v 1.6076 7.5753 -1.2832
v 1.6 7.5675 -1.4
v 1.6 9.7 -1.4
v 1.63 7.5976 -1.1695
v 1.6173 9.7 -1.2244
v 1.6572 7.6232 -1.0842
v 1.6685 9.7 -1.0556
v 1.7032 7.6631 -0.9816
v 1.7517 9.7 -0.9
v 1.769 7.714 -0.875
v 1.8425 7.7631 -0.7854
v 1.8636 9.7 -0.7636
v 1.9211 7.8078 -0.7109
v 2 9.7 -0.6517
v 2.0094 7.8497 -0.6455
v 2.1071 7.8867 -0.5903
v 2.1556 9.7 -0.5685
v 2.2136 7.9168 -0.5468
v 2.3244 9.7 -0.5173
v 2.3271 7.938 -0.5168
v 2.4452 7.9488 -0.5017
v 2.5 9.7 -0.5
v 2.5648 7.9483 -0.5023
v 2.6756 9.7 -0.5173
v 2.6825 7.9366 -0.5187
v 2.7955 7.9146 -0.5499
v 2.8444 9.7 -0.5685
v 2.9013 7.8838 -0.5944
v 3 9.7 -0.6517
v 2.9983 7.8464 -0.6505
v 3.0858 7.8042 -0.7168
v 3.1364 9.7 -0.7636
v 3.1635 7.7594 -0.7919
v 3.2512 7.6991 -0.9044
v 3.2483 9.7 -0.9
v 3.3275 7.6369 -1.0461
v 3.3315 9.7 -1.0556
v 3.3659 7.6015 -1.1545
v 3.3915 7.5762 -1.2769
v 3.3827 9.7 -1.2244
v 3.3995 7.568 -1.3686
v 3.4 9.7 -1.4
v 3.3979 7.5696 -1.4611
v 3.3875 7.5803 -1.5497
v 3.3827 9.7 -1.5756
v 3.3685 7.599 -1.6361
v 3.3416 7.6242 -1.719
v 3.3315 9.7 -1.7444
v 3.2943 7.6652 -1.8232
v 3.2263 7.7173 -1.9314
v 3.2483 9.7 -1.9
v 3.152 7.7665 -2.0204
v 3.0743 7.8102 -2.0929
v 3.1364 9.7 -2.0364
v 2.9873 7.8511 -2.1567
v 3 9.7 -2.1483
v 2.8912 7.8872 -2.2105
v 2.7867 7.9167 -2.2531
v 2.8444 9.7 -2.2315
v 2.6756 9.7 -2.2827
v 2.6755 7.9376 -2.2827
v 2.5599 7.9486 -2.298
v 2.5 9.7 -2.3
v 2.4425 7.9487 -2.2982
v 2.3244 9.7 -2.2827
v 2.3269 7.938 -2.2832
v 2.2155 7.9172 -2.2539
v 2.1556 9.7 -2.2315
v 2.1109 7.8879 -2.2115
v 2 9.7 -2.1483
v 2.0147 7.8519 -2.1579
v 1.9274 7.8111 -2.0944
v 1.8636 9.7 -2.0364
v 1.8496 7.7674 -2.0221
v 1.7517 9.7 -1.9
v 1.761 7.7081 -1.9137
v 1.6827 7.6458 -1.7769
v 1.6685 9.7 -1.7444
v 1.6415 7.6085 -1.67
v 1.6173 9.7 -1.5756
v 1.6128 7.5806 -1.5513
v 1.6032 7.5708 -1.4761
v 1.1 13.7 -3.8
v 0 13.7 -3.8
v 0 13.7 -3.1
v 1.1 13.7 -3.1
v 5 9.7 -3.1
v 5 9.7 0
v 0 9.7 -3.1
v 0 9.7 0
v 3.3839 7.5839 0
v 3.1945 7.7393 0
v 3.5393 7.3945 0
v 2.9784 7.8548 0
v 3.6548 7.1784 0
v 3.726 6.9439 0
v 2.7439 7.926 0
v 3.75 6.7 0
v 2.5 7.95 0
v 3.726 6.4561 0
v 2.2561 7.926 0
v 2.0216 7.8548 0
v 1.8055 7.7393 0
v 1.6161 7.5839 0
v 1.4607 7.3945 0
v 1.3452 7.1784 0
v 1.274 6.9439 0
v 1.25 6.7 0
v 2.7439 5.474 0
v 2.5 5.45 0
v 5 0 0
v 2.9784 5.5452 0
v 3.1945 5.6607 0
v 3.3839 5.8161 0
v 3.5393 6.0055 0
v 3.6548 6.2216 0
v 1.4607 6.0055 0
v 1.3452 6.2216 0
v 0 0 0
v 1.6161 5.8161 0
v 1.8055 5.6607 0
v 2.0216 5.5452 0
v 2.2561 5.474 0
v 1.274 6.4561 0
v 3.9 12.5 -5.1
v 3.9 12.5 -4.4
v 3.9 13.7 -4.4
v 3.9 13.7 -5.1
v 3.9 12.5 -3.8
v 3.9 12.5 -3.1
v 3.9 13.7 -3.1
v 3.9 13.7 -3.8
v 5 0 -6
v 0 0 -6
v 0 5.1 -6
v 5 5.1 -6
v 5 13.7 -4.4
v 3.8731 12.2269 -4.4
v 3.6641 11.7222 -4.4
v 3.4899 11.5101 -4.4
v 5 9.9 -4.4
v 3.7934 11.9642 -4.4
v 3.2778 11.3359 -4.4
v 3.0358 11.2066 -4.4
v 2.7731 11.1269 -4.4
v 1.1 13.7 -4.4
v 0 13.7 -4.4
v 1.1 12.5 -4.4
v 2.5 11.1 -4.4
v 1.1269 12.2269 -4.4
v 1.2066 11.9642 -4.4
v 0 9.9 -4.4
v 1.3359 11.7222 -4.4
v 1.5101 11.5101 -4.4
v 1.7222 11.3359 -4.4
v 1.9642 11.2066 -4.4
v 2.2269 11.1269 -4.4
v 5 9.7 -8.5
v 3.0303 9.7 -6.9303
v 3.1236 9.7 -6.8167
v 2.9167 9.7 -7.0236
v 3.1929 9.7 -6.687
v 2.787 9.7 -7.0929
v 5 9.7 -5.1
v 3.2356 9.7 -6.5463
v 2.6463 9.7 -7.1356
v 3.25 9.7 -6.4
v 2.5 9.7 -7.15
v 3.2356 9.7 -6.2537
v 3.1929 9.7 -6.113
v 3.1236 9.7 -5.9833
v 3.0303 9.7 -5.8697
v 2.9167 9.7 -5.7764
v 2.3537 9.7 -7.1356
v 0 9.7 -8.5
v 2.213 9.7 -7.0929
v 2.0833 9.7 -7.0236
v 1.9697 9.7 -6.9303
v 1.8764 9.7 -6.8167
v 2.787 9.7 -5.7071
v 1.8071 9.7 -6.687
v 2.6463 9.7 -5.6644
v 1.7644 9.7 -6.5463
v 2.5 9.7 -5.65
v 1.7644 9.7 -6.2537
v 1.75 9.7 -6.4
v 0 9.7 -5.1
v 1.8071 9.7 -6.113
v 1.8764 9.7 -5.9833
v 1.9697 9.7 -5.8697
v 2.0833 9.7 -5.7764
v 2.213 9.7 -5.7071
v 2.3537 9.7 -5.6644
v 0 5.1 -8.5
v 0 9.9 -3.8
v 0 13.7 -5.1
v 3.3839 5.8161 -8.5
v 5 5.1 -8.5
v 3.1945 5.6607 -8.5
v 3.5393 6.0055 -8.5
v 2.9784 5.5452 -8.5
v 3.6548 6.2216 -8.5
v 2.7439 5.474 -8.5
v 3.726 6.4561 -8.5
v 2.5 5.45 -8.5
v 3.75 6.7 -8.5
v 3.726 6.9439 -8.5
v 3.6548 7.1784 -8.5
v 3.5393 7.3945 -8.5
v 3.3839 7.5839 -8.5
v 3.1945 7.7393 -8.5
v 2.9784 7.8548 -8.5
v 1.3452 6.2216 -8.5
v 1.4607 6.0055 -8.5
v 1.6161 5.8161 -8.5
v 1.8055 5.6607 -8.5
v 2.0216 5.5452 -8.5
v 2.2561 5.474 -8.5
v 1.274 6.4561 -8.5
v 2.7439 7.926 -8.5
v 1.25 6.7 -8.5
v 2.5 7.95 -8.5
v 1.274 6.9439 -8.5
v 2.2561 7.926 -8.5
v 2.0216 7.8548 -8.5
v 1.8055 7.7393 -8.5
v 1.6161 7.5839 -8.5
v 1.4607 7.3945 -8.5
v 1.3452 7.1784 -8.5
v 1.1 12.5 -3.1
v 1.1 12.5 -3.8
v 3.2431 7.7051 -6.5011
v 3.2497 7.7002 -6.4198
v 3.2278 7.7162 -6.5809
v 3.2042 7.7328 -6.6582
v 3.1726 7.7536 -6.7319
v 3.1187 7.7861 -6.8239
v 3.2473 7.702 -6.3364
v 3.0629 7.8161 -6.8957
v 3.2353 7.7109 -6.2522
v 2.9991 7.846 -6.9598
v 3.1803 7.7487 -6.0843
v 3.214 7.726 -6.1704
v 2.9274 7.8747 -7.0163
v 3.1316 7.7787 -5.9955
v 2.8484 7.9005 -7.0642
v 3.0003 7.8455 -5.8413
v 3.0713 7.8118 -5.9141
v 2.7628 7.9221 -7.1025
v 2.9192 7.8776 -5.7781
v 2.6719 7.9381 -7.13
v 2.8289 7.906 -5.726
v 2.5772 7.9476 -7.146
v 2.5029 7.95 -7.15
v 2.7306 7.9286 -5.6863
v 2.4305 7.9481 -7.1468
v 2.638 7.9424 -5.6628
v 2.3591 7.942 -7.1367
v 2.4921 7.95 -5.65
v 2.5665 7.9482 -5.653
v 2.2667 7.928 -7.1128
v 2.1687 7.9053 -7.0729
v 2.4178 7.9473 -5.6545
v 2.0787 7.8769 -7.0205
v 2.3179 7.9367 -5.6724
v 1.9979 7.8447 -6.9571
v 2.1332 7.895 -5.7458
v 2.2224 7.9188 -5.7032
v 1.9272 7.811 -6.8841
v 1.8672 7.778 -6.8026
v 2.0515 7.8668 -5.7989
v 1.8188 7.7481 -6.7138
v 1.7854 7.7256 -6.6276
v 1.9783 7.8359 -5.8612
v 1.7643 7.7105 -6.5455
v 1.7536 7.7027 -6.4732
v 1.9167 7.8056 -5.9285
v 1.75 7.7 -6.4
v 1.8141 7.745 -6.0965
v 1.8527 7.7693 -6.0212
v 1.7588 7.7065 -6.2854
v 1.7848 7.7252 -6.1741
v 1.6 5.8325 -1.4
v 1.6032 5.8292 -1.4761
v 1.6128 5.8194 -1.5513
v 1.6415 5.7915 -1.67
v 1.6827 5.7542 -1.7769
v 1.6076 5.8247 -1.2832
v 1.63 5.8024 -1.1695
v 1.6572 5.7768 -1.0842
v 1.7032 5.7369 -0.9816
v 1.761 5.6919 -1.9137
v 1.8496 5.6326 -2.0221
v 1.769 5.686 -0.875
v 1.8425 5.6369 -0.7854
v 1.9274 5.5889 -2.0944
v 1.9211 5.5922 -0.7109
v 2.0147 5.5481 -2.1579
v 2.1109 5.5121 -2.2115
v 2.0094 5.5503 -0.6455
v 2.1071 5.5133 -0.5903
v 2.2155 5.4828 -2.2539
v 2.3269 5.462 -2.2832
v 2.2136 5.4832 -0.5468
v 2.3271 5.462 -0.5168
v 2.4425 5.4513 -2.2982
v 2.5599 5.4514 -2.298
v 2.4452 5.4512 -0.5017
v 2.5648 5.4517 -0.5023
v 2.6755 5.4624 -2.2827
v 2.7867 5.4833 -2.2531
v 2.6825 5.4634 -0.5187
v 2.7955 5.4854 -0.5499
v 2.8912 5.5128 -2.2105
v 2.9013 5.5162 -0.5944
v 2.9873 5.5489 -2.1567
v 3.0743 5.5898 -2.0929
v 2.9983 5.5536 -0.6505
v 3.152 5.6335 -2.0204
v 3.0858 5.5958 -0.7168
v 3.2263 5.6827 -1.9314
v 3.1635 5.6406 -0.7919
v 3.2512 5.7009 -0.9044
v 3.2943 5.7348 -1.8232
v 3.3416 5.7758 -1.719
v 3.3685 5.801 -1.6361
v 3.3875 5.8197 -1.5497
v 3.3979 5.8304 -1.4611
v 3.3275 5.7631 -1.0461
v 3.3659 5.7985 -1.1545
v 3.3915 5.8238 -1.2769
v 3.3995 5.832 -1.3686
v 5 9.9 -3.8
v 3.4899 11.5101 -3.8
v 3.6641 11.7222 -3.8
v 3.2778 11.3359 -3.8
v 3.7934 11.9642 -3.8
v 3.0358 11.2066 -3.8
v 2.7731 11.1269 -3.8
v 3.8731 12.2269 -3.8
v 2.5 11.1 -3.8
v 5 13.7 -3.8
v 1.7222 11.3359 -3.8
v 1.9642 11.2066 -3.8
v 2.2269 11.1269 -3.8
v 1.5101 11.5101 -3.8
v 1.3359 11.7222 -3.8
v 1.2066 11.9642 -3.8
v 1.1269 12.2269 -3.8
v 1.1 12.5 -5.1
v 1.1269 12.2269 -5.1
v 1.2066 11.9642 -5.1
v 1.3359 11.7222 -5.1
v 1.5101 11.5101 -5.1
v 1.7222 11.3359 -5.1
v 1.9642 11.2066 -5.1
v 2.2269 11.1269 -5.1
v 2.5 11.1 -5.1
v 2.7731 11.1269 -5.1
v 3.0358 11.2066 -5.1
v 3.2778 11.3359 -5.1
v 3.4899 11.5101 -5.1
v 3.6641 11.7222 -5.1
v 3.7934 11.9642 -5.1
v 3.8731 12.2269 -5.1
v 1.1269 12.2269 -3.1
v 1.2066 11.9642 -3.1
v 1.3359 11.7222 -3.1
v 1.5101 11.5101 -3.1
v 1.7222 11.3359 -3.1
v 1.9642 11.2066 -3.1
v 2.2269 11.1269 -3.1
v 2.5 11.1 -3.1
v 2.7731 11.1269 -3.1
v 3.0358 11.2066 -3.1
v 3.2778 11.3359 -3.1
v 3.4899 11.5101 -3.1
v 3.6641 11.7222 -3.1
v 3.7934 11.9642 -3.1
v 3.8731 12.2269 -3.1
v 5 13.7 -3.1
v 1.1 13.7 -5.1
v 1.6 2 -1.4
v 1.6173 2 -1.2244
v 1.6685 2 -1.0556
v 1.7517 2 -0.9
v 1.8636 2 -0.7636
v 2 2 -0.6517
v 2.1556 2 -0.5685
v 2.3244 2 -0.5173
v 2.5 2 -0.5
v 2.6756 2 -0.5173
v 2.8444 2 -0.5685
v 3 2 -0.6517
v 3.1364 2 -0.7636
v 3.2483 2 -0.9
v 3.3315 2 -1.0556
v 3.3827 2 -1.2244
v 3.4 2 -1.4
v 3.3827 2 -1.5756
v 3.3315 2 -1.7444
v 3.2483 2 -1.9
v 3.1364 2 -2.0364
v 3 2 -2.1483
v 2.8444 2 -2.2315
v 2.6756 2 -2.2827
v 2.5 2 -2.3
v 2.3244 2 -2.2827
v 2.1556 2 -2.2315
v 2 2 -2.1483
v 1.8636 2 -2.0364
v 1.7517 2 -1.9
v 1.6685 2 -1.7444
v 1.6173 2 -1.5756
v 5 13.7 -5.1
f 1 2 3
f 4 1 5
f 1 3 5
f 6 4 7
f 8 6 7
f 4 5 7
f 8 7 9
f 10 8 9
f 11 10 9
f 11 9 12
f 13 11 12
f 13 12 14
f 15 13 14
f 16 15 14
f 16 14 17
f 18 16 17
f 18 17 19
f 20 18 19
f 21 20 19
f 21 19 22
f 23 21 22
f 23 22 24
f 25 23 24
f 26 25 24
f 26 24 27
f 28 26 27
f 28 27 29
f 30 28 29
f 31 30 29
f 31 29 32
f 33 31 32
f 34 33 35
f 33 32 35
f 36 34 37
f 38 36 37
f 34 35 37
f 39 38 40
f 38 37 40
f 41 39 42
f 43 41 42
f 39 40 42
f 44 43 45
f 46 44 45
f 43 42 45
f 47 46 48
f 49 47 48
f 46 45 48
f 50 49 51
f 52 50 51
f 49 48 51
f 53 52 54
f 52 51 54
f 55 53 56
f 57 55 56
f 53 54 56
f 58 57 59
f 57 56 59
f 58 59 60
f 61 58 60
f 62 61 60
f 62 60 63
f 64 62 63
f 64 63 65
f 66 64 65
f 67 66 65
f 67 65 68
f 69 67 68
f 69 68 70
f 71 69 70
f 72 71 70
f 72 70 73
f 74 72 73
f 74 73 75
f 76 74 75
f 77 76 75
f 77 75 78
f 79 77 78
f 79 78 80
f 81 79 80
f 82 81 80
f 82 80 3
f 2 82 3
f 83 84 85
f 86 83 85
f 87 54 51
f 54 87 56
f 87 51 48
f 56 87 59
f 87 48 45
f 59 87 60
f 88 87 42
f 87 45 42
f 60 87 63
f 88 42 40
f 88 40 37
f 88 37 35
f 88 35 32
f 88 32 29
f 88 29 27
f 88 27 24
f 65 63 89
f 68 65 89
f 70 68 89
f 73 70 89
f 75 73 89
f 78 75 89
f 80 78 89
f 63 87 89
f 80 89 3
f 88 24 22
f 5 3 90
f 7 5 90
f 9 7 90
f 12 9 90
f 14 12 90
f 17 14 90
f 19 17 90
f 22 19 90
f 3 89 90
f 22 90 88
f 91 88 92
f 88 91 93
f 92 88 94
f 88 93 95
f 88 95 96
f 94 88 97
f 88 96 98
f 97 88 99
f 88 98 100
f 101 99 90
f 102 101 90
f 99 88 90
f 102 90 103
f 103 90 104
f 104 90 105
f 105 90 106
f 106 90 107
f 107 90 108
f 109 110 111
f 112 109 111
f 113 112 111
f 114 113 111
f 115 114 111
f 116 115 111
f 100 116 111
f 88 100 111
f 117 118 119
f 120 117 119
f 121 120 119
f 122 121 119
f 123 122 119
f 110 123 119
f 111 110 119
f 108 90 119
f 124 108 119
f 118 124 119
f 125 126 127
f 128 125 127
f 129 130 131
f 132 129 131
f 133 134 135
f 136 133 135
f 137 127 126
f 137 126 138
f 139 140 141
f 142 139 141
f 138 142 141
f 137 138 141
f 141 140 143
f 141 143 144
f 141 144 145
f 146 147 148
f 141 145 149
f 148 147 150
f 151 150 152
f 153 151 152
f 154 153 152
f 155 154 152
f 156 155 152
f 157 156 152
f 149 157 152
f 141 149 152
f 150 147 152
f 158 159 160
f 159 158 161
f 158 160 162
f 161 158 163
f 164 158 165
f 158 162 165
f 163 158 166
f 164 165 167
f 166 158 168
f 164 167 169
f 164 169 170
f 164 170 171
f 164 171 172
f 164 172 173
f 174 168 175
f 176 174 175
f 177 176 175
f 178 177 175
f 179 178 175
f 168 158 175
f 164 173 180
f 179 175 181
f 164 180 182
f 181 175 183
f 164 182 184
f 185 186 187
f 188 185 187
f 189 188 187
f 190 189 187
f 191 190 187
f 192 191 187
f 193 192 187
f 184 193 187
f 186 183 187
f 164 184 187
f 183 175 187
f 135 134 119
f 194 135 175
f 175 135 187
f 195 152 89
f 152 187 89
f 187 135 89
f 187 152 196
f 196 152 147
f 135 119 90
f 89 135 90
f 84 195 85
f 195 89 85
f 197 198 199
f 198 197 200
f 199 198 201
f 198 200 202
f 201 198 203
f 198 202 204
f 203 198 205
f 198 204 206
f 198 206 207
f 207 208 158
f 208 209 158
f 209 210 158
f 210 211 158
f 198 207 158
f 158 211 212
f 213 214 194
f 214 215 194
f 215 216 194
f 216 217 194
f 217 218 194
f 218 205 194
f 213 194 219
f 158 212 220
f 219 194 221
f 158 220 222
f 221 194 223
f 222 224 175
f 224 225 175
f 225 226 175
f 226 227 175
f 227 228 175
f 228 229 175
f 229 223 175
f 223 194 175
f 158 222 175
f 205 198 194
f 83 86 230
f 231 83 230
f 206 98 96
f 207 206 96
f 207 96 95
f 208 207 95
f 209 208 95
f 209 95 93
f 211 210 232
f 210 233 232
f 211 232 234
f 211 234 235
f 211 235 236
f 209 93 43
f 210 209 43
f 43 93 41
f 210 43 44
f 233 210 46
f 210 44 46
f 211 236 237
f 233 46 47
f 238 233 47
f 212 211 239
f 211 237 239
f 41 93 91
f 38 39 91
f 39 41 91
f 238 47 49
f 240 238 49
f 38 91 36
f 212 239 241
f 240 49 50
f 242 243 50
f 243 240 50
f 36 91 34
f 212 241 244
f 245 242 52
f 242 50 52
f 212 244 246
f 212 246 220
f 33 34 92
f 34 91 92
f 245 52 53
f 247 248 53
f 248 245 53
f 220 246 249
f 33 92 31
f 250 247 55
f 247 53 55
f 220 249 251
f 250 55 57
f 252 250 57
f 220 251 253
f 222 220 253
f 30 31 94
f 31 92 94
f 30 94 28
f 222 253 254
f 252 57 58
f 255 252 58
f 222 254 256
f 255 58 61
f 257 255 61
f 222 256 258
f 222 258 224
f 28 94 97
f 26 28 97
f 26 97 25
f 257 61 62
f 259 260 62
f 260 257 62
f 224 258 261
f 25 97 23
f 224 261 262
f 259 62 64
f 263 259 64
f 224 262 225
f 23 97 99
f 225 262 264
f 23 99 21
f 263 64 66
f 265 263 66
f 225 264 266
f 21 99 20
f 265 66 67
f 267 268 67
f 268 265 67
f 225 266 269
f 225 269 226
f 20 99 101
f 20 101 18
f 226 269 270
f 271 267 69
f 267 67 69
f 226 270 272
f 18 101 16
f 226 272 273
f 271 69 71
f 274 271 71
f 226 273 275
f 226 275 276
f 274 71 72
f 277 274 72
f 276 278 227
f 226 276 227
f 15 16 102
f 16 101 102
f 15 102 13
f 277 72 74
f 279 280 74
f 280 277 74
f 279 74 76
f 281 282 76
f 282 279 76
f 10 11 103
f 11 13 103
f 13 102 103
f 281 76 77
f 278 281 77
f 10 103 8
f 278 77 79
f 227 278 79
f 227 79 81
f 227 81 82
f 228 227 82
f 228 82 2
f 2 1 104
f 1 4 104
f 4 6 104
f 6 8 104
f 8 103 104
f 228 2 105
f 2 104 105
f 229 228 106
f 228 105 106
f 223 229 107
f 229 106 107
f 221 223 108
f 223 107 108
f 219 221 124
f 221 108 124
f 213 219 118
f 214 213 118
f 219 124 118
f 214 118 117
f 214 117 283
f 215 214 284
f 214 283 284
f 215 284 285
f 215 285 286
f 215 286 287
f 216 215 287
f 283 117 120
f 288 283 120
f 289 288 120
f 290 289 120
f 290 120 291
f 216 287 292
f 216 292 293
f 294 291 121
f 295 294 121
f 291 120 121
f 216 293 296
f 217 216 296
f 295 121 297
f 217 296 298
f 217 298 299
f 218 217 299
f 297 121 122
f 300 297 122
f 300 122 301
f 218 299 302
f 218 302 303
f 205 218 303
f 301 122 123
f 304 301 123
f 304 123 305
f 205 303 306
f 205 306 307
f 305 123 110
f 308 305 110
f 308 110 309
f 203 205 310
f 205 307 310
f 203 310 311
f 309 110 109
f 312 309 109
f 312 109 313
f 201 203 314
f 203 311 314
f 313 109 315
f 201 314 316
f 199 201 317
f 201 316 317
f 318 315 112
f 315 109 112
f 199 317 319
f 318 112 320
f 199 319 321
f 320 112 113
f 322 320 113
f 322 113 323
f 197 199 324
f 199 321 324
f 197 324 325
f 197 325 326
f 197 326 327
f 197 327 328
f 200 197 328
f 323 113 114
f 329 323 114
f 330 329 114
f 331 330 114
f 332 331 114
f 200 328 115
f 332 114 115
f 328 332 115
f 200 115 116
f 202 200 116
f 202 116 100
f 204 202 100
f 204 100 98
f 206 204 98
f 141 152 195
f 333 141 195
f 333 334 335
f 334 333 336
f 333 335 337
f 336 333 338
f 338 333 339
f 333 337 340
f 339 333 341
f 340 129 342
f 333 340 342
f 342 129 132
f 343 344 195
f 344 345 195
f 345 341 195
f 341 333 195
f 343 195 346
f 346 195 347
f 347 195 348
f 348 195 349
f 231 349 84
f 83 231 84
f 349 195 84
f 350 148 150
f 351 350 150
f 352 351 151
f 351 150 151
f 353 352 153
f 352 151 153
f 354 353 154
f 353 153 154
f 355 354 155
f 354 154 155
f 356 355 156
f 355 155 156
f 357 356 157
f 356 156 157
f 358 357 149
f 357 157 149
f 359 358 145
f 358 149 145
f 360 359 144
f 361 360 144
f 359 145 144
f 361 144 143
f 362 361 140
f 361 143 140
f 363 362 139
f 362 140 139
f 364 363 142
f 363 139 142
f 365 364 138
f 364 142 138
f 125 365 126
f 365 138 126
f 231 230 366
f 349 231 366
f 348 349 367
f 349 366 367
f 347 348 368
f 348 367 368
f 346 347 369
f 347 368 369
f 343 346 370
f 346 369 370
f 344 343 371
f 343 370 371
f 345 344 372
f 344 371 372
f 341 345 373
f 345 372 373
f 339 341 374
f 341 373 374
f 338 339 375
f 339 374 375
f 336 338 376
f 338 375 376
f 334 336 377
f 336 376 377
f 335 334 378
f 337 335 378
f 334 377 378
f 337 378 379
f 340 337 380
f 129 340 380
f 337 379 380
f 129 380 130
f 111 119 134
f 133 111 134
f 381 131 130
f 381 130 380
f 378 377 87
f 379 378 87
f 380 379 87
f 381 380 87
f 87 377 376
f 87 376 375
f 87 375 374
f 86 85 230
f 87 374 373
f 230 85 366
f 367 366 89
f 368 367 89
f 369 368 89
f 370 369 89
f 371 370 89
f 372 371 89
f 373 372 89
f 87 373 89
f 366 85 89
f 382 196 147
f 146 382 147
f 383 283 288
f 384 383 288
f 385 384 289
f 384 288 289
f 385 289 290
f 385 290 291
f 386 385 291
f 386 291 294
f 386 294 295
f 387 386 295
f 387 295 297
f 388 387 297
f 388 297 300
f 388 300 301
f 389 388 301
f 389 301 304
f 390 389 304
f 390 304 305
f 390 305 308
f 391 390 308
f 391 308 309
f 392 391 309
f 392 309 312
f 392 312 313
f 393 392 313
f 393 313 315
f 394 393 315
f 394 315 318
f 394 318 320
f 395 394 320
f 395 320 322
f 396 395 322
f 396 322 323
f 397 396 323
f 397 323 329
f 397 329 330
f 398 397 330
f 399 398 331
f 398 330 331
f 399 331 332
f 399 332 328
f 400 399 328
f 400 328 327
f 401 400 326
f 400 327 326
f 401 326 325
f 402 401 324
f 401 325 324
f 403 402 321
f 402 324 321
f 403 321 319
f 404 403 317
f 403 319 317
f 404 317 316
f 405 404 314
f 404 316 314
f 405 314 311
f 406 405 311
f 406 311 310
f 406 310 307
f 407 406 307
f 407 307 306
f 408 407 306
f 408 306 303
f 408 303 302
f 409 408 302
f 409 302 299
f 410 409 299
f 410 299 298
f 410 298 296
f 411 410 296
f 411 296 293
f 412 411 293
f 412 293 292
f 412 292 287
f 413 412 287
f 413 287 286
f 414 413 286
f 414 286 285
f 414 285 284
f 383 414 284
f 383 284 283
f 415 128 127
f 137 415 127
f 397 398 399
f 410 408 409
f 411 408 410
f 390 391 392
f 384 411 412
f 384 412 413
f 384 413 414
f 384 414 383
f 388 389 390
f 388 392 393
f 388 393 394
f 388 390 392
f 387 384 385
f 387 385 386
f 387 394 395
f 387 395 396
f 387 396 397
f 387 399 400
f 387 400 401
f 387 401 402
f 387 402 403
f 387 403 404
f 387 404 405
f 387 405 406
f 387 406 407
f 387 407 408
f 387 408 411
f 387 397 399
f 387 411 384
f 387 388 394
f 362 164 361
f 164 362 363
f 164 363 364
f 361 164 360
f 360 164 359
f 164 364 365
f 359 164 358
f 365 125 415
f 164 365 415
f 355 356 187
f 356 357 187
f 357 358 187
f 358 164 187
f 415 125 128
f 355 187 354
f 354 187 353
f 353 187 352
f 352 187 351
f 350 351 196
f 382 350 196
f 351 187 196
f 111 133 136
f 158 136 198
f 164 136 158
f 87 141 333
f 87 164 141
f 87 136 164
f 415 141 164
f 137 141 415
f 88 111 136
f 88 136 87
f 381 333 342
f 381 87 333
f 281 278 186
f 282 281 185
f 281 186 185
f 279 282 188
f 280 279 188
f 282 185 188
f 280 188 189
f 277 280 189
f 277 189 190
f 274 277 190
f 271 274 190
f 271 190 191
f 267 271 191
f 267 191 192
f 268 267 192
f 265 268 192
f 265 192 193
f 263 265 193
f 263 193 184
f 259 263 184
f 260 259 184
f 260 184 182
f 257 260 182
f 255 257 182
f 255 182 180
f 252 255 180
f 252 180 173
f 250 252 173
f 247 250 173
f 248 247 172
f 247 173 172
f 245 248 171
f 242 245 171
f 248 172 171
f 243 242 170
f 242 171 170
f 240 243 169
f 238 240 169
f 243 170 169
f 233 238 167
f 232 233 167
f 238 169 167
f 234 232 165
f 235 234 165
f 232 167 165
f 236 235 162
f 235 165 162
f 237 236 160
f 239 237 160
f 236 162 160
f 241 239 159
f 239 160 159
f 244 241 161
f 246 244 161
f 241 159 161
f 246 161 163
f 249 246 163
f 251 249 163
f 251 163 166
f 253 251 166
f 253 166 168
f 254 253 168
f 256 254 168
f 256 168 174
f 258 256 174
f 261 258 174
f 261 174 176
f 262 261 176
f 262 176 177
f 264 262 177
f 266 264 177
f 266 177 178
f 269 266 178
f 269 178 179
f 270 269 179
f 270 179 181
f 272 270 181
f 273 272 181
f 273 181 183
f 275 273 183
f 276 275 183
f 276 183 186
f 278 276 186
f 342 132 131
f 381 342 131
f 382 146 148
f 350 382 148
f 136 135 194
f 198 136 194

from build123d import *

# Parameters (mm, degrees)
F1_DEPTH = 5
F3_DEPTH = 5.401
F4_R     = 1.25
F5_DEPTH = 8.501
F6_R     = 0.9
F7_DEPTH = 7.7
F8_R     = 0.75
F9_DEPTH = 2.0010001


with BuildPart() as f1:
    # F0 (on Right) → F1 (new body)
    with BuildSketch(Plane.YZ):
        Polygon((9.7, 0), (0, 0), (0, -6), (5.1, -6), (5.1, -8.5), (9.7, -8.5), (9.7, -5.1), (13.7, -5.1), (13.7, -4.4), (9.9, -4.4), (9.9, -3.8), (13.7, -3.8), (13.7, -3.1), (9.7, -3.1), align=None)
    extrude(amount=F1_DEPTH)

    # F2 (on face) → F3 (cut, through all)
    with BuildSketch(Plane.XY.offset(-3.1)):
        with BuildLine():
            Line((1.1, 13.7), (1.1, 12.5))
            ThreePointArc((1.1, 12.5), (2.5, 11.1), (3.9, 12.5))
            Line((3.9, 12.5), (3.9, 13.7))
            Line((3.9, 13.7), (1.1, 13.7))
        make_face()
    extrude(amount=-F3_DEPTH, mode=Mode.SUBTRACT)

    # F4 (on face) → F5 (cut, through all)
    with BuildSketch(Plane.XY):
        with Locations((2.5, 6.7)):
            Circle(F4_R)
    extrude(amount=-F5_DEPTH, mode=Mode.SUBTRACT)

    # F6 (on face) → F7 (cut)
    with BuildSketch(Plane(origin=(0, 9.7, 0), x_dir=(-1, 0, 0), z_dir=(0, 1, 0))):
        with Locations((-2.5, -1.4)):
            Circle(F6_R)
    extrude(amount=-F7_DEPTH, mode=Mode.SUBTRACT)

    # F8 (on face) → F9 (cut, through all)
    with BuildSketch(Plane(origin=(0, 9.7, 0), x_dir=(-1, 0, 0), z_dir=(0, 1, 0))):
        with Locations((-2.5, -6.4)):
            Circle(F8_R)
    extrude(amount=-F9_DEPTH, mode=Mode.SUBTRACT)


solid = f1.part
